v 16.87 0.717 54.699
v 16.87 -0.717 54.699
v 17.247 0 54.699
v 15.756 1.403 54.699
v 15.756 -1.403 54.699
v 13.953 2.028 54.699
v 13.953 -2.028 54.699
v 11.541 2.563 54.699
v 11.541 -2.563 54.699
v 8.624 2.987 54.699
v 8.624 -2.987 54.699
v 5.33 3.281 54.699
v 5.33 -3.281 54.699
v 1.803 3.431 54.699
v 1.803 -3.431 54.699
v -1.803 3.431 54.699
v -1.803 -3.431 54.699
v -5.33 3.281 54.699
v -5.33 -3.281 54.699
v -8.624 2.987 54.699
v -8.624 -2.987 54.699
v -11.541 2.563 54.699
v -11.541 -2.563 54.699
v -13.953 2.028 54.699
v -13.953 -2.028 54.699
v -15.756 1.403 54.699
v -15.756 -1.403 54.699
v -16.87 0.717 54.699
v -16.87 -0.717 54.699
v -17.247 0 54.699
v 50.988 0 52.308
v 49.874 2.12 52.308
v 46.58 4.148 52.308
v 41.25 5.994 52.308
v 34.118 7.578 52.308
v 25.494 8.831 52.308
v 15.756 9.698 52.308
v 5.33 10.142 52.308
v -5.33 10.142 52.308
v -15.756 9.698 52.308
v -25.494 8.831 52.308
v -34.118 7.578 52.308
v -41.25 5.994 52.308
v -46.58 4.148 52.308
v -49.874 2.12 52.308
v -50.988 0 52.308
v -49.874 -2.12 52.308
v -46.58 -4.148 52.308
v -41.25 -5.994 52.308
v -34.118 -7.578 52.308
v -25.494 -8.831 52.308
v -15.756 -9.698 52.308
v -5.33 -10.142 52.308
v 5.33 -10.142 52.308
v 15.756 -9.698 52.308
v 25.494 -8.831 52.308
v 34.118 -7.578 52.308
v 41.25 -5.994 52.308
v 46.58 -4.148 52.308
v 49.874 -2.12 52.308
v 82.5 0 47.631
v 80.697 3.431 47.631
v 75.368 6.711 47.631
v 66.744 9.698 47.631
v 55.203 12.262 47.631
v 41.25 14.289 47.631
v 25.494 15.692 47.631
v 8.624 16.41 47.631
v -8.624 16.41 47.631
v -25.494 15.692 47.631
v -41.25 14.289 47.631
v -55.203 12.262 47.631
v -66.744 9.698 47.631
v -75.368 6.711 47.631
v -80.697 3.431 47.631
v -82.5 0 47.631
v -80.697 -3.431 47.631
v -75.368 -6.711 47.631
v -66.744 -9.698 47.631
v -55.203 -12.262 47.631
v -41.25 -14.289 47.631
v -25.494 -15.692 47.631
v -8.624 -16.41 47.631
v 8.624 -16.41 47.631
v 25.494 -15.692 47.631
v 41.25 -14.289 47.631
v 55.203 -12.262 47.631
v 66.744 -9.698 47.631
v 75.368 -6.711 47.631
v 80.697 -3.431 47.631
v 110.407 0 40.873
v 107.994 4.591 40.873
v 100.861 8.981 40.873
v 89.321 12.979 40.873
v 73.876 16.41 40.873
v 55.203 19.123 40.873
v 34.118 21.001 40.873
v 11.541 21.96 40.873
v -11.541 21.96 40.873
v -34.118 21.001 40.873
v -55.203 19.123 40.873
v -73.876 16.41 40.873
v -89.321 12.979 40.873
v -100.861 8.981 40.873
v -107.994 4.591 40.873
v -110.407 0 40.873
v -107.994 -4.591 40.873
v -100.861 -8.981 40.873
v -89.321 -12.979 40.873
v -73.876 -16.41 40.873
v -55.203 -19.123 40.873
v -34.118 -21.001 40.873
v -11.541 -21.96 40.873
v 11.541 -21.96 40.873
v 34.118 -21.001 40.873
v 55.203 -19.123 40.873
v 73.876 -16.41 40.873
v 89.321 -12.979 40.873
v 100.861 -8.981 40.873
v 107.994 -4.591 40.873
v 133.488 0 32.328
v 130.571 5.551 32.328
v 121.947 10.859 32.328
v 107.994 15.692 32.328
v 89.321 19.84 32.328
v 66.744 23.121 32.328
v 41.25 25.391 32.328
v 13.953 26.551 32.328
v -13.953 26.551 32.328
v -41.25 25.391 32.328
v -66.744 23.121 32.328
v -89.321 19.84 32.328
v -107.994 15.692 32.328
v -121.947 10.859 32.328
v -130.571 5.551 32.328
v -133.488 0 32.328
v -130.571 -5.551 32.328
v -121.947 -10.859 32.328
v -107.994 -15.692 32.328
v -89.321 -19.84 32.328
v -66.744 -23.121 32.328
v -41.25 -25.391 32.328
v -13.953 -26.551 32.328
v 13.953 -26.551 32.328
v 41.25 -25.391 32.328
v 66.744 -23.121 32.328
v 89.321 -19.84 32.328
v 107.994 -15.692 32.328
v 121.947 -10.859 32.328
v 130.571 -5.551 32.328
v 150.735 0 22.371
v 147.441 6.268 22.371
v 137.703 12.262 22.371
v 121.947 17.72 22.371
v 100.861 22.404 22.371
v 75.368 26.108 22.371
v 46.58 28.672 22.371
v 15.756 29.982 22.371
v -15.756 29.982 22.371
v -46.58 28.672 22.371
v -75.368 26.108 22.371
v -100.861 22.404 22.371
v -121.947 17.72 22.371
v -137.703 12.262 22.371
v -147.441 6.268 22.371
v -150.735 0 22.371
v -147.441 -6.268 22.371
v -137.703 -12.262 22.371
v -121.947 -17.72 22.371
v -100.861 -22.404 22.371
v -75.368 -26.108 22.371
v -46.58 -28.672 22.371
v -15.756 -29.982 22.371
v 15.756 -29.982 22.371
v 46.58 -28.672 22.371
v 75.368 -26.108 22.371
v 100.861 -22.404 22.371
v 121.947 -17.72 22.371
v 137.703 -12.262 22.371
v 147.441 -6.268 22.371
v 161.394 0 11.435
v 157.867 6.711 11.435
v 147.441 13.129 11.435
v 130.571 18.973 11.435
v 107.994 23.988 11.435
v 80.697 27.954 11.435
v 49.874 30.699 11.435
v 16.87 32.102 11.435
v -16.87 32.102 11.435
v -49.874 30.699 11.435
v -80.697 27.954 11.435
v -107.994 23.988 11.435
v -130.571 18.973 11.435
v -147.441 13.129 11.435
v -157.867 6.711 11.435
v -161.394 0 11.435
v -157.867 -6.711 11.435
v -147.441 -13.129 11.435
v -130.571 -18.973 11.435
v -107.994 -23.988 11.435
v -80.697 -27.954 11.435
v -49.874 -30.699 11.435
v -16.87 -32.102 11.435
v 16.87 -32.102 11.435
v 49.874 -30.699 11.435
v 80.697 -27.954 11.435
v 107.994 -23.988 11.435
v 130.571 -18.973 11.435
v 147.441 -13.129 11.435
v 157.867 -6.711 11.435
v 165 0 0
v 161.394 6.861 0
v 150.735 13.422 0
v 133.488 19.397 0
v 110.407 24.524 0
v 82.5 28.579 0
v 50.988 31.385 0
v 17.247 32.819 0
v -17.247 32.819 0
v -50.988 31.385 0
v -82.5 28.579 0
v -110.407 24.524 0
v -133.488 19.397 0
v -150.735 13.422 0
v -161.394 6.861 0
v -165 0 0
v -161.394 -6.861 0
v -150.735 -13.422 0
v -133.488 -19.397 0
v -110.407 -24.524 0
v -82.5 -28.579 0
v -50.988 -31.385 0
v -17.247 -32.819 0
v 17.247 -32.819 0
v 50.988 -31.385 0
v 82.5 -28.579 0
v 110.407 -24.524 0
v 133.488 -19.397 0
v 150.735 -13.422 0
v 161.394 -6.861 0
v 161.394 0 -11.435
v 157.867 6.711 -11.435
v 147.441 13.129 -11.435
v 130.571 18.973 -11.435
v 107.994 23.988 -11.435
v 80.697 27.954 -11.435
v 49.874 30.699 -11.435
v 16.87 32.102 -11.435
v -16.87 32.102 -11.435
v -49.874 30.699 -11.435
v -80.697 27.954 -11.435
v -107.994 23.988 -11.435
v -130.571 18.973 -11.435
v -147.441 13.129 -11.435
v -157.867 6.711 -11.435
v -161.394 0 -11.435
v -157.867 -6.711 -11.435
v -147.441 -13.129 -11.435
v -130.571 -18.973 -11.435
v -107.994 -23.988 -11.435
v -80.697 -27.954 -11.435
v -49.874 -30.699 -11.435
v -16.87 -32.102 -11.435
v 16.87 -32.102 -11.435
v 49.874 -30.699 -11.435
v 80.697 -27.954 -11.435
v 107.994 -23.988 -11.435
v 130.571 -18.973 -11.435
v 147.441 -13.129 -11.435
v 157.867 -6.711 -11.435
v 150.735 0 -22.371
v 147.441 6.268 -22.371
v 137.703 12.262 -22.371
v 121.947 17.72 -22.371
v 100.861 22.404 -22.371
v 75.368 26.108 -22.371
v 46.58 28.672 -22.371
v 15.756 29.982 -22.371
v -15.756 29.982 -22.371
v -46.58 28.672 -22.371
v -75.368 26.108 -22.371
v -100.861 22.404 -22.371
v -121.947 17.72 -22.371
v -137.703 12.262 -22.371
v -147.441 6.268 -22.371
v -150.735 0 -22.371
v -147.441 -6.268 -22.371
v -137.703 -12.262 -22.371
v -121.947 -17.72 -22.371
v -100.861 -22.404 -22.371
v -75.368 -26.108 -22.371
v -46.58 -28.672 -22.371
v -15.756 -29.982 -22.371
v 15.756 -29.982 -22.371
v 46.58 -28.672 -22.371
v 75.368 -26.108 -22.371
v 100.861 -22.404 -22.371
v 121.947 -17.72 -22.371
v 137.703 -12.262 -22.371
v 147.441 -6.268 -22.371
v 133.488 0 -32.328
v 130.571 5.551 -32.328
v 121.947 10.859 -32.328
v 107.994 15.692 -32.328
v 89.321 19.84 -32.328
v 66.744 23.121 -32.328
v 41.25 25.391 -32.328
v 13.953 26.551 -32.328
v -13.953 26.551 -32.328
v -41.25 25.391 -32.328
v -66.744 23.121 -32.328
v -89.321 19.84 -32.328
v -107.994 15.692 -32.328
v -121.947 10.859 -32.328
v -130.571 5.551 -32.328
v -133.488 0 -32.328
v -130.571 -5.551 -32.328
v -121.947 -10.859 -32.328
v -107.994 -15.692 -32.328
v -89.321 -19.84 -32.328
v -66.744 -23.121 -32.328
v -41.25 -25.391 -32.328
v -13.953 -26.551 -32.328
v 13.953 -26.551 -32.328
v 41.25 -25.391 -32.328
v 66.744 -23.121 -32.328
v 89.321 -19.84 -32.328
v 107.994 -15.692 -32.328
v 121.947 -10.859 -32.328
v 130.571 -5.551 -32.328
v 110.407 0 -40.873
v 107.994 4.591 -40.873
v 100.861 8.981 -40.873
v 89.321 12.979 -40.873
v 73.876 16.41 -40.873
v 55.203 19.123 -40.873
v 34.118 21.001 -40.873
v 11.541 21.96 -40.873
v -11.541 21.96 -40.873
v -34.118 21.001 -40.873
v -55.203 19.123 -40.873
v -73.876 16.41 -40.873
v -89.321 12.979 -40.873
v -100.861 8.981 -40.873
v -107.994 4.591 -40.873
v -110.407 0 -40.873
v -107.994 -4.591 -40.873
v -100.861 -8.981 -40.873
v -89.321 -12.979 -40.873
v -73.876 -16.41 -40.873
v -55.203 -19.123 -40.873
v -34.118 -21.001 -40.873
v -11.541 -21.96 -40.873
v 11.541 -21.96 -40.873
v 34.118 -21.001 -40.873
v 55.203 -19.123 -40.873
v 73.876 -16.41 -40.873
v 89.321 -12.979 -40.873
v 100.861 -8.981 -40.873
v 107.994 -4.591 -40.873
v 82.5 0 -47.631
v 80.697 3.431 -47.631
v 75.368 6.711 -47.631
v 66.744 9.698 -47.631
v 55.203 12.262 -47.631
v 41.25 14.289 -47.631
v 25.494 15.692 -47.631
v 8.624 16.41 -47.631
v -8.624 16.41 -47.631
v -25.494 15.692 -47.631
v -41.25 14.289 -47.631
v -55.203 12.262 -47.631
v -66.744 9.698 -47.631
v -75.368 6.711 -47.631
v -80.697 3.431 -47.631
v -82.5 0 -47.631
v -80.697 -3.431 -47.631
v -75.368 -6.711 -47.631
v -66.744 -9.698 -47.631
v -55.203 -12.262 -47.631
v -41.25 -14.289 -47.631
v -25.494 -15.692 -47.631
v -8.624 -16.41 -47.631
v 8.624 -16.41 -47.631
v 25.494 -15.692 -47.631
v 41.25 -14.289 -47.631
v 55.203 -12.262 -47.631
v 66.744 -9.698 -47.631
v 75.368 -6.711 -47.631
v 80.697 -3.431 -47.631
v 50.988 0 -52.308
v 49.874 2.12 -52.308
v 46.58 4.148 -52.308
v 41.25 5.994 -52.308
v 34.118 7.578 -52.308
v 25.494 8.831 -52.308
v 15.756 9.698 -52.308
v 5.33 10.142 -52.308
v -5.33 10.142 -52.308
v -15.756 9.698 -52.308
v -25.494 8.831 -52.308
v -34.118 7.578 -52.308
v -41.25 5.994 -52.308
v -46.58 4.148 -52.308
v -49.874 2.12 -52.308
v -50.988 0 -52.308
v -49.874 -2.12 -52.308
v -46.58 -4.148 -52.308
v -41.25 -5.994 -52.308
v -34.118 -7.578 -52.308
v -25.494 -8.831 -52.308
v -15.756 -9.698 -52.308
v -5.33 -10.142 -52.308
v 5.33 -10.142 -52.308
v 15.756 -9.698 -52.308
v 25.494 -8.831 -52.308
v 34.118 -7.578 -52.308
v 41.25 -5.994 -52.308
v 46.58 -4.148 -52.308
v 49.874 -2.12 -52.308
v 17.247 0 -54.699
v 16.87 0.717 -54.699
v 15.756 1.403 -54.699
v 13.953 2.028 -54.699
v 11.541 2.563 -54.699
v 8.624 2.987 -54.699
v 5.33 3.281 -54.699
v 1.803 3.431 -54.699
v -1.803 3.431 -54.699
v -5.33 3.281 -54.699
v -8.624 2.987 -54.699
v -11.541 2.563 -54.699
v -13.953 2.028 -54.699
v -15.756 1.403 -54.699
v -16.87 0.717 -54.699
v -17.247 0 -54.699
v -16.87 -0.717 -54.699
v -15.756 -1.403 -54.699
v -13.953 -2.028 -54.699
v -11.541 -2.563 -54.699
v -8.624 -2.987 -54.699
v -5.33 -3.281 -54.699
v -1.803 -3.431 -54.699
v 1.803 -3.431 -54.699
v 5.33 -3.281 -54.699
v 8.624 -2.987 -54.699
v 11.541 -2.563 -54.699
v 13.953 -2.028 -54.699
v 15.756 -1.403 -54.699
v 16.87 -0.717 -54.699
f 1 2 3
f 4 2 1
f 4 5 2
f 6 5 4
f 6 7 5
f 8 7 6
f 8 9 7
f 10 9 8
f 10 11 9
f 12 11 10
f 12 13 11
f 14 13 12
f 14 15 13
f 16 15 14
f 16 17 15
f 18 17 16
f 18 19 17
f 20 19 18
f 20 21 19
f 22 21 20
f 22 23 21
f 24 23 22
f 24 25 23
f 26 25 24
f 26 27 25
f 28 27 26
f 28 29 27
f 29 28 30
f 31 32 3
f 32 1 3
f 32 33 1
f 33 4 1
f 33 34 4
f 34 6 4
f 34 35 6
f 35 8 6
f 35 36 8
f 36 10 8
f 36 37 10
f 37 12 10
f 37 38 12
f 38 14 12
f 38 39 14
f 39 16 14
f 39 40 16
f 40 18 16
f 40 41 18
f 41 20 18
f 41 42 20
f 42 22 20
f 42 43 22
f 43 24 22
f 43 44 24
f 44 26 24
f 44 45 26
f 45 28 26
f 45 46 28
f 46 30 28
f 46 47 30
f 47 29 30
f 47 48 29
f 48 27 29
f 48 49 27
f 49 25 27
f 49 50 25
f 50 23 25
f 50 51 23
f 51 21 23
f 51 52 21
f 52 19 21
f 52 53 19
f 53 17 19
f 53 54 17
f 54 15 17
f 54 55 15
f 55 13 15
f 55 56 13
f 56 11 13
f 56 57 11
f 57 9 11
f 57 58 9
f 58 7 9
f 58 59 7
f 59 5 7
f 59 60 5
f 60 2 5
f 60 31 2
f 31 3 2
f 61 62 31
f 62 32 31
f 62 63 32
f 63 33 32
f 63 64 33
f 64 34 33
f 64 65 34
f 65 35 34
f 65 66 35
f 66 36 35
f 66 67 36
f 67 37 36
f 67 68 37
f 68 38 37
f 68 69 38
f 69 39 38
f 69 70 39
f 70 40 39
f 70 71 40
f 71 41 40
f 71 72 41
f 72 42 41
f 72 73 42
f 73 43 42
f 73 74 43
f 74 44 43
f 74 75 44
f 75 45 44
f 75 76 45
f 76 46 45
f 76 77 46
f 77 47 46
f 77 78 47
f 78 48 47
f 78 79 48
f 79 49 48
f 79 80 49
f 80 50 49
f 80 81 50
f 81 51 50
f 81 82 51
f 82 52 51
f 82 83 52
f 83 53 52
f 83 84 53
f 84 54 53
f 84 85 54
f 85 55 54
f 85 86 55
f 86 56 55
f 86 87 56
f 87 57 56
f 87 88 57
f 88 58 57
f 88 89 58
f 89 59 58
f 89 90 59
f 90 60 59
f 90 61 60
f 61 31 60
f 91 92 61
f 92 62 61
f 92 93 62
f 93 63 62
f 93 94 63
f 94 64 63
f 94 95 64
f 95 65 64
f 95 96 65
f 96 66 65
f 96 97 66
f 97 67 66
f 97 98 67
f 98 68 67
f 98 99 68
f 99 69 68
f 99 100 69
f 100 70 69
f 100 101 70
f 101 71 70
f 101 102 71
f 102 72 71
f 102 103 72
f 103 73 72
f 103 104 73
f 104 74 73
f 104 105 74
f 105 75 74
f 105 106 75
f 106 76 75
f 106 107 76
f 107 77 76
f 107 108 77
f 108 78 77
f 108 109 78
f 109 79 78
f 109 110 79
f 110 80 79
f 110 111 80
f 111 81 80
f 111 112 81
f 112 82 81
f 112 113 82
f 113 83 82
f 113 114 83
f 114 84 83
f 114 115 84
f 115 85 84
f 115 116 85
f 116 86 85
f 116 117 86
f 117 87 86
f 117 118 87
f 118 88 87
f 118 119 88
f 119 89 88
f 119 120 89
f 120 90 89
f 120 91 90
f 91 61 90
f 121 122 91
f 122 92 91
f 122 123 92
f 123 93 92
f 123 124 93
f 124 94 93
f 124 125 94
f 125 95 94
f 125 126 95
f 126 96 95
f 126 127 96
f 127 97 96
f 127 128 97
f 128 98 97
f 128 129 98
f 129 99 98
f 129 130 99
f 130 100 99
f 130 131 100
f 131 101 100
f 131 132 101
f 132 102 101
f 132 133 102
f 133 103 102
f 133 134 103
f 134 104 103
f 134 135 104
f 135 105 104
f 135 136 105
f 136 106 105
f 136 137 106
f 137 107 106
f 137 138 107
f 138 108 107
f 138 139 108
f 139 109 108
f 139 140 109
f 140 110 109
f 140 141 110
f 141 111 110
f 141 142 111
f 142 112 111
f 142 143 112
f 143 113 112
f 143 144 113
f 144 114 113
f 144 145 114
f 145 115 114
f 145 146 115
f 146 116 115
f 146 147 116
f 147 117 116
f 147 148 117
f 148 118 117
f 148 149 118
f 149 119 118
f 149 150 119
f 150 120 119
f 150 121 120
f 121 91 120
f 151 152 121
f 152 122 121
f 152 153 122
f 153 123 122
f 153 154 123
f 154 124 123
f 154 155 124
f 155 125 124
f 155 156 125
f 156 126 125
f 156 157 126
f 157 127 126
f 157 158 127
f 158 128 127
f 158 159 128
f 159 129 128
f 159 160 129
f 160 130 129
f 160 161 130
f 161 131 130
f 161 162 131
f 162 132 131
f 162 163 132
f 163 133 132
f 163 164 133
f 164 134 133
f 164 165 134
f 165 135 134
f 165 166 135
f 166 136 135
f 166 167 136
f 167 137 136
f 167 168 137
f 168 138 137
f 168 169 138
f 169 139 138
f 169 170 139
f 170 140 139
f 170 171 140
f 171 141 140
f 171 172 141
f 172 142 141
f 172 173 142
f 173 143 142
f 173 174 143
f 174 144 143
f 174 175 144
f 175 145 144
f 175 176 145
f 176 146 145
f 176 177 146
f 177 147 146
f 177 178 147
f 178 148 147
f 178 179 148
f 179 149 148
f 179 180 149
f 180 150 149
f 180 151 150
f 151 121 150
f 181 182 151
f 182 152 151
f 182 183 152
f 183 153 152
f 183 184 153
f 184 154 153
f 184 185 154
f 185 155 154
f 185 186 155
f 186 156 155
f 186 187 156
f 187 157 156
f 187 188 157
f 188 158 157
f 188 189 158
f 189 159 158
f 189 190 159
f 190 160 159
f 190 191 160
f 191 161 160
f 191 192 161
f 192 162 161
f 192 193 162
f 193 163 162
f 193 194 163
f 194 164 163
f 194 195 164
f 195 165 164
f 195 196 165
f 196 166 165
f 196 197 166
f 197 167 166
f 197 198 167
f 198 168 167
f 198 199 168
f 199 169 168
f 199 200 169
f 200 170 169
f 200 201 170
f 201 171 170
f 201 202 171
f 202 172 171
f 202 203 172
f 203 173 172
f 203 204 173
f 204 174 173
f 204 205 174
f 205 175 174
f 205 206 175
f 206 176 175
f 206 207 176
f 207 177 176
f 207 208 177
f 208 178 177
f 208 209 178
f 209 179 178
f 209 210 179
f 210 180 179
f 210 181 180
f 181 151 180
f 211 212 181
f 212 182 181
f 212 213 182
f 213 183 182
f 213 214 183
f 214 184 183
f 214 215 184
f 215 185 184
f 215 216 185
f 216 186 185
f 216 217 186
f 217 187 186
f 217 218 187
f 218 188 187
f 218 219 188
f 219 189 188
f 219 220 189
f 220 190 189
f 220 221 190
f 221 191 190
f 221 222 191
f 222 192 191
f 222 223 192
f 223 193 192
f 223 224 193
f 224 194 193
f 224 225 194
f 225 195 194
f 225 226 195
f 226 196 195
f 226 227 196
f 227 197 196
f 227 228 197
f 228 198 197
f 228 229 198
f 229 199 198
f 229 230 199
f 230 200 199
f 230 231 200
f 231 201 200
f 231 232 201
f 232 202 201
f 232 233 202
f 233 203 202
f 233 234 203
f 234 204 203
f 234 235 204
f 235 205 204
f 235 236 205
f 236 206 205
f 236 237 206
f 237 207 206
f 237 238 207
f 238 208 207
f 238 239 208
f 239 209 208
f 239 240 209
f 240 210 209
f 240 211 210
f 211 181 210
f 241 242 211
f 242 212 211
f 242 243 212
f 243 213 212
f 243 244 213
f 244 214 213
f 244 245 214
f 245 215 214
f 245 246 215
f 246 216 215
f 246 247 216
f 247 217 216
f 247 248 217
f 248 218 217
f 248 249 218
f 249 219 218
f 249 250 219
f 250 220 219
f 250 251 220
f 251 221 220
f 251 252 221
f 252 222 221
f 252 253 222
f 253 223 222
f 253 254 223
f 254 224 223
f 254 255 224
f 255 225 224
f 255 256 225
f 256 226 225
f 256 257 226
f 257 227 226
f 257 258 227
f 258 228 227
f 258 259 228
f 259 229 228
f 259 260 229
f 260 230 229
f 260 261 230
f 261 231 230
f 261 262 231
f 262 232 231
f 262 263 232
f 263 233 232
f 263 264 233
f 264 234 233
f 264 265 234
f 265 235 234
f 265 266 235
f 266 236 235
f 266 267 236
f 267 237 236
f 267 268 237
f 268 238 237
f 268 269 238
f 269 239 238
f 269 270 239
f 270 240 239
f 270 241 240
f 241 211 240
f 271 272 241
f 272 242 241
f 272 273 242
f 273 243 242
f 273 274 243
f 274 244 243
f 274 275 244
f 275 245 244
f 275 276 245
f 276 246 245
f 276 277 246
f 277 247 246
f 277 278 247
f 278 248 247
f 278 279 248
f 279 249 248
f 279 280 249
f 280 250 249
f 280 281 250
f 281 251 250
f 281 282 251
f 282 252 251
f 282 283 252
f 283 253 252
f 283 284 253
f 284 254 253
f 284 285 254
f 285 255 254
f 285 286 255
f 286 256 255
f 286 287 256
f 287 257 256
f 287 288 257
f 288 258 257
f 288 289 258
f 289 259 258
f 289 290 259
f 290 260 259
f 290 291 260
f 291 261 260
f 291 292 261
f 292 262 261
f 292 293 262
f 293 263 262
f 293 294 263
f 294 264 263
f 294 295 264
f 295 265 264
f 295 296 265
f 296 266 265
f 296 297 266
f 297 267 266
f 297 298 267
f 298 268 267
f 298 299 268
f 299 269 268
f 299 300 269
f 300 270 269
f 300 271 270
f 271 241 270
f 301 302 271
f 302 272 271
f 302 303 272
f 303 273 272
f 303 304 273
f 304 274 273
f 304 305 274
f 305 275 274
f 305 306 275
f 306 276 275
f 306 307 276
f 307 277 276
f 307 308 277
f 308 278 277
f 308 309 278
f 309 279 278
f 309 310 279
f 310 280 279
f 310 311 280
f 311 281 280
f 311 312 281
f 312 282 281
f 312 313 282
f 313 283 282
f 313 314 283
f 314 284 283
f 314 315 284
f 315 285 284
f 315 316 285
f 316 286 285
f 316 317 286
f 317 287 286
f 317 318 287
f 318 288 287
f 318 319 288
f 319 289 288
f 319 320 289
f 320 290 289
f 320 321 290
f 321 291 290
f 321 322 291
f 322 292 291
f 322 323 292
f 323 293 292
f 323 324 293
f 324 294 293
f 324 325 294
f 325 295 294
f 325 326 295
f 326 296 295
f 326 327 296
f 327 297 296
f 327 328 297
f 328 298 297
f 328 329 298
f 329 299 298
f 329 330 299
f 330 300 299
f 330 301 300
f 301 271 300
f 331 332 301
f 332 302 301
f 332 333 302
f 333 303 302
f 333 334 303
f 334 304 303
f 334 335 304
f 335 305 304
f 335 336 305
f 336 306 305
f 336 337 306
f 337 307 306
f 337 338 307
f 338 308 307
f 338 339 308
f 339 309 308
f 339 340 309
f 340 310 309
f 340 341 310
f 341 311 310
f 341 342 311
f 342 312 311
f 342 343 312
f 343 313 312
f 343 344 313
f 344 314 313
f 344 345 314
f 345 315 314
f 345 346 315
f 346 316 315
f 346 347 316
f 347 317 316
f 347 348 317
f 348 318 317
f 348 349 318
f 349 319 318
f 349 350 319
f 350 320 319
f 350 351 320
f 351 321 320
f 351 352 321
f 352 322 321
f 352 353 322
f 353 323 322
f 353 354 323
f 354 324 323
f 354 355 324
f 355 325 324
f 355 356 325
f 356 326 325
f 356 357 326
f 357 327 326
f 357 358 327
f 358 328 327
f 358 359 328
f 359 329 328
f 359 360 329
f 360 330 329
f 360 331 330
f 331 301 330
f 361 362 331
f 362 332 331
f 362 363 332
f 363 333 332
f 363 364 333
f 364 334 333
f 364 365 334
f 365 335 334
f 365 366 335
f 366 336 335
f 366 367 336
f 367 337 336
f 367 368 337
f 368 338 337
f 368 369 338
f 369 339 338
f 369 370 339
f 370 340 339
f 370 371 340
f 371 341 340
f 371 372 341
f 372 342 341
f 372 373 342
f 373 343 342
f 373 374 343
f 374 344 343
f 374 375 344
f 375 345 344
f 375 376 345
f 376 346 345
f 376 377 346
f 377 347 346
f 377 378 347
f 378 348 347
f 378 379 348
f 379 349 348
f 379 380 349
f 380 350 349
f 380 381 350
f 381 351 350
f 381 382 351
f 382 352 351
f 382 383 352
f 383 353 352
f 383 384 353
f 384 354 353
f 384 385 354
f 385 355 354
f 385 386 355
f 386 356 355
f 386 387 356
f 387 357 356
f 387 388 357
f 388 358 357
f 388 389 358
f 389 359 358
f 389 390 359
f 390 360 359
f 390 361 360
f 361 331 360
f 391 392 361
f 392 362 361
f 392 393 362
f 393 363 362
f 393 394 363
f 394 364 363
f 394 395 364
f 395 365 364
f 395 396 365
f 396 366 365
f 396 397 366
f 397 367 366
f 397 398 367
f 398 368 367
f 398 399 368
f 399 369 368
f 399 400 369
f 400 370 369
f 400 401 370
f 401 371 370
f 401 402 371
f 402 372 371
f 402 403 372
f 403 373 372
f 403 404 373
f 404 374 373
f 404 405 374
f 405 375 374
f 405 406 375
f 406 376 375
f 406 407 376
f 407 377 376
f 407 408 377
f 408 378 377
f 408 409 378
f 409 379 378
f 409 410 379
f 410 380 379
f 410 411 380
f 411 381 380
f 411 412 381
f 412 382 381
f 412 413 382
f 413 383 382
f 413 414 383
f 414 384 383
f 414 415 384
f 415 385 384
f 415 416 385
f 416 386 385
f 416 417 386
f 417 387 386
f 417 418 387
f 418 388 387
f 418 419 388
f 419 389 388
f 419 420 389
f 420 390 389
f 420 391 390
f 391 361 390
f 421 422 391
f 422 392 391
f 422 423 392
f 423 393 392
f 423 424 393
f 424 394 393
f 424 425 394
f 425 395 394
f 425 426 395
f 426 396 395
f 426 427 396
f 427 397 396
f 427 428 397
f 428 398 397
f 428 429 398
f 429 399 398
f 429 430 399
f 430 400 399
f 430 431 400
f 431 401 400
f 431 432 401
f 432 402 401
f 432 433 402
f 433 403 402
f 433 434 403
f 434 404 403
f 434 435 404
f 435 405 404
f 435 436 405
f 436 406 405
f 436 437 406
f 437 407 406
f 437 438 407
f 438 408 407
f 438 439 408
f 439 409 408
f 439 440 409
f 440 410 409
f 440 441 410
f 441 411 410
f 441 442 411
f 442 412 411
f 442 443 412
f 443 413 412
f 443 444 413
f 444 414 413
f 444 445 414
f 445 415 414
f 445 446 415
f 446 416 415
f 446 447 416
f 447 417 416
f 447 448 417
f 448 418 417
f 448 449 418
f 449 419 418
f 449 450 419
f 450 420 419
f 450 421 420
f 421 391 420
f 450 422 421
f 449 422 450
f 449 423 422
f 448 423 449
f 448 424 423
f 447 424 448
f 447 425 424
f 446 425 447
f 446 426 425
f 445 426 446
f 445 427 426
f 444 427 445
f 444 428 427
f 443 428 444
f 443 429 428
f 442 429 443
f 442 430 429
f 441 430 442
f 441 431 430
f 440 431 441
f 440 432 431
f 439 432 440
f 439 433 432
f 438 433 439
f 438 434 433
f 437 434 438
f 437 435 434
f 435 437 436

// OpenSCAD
// Generated by SolidPython 1.0.1 on 2020-07-29 00:46:51


scale(v = [15, 3, 5]) {
	sphere(r = 11);
}
/***********************************************
*********      SolidPython code:      **********
************************************************
 
# import packages: SolidPython
from solid import *
from solid.utils import *
from itertools import chain, combinations, permutations


class Resize:

    def __init__(self, scad_file):
        self.scad_file = scad_file
        #self.scad_file = import_scad(scad_file)
        # cone/cylinder param:
        self.r1 = 0
        self.r2 = 0
        self.h = 0
        # rectangular prism param:
        self.w = 0
        self.l = 0
        # ellipse param:
        self.r = 0

    # import OpenScad code (file name corresponds to shape)


    # classify shape + parameters
    def assign(self, param1, param2, param3):
        if self.scad_file == 'cone.scad':
            self.r1 = param1
            self.r2 = param2
            self.h = param3
        elif self.scad_file == 'cylinder.scad':
            self.r1 = param1
            self.r2 = param2
            self.h = param3
        elif self.scad_file == 'rectangularPrism.scad':
            self.h = param1
            self.l = param2
            self.w = param3
        else:
            self.r = param1
            self.h = param2

    # resize parameters
    def iterate(self):
        x = range(3, 20, 2)
        i = 1
        if self.scad_file == 'cone.scad':
            tempList = list(permutations(x, 2))
            for temp in tempList:
                param1 = temp[0]
                param2 = temp[1]
                filepath = 'produced_scad_files/' + 'cone' + str(param1) + '_' + str(param2) + '_' + '.scad'
                scad_render_to_file(cylinder(h=param1, r1=param2, r2=0), filepath)

        elif self.scad_file == 'cylinder.scad':
            tempList = list(permutations(x, 3))
            for temp in tempList:
                param1 = temp[0]
                param2 = temp[1]
                filepath = 'produced_scad_files/' + 'cylinder' + str(param1) + '_' + str(param2) + '_' + '.scad'
                scad_render_to_file(cylinder(h=param1, r1=param2, r2=param2), filepath)

        elif self.scad_file == 'rectangularPrism.scad':
            tempList = list(permutations(x, 3))
            for temp in tempList:
                param1 = temp[0]
                param2 = temp[1]
                param3 = temp[2]
                filepath = 'produced_scad_files/' + 'rectangularPrism' + str(param1) + '_' + str(param2) + '_' + str(
                    param3) + '.scad'
                scad_render_to_file(cube(size=(param1, param2, param3)), filepath)

        elif self.scad_file == 'ellipse.scad':
            tempList = list(permutations(x, 4))
            for temp in tempList:
                param1 = temp[0]
                param2 = temp[1]
                param3 = temp[2]
                param4 = temp[3]
                filepath = 'produced_scad_files/' + 'ellipse' + str(param1) + '_' + str(param2) + '_' + str(param3) + '_' + str(param4) + '.scad'
                scad_render_to_file(scale([param1, param2, param3])(sphere(r=param4)), filepath)

    def render_to_scadfile(self):
        scad_render_to_file(scad, 'example.scad') 
 
************************************************/
